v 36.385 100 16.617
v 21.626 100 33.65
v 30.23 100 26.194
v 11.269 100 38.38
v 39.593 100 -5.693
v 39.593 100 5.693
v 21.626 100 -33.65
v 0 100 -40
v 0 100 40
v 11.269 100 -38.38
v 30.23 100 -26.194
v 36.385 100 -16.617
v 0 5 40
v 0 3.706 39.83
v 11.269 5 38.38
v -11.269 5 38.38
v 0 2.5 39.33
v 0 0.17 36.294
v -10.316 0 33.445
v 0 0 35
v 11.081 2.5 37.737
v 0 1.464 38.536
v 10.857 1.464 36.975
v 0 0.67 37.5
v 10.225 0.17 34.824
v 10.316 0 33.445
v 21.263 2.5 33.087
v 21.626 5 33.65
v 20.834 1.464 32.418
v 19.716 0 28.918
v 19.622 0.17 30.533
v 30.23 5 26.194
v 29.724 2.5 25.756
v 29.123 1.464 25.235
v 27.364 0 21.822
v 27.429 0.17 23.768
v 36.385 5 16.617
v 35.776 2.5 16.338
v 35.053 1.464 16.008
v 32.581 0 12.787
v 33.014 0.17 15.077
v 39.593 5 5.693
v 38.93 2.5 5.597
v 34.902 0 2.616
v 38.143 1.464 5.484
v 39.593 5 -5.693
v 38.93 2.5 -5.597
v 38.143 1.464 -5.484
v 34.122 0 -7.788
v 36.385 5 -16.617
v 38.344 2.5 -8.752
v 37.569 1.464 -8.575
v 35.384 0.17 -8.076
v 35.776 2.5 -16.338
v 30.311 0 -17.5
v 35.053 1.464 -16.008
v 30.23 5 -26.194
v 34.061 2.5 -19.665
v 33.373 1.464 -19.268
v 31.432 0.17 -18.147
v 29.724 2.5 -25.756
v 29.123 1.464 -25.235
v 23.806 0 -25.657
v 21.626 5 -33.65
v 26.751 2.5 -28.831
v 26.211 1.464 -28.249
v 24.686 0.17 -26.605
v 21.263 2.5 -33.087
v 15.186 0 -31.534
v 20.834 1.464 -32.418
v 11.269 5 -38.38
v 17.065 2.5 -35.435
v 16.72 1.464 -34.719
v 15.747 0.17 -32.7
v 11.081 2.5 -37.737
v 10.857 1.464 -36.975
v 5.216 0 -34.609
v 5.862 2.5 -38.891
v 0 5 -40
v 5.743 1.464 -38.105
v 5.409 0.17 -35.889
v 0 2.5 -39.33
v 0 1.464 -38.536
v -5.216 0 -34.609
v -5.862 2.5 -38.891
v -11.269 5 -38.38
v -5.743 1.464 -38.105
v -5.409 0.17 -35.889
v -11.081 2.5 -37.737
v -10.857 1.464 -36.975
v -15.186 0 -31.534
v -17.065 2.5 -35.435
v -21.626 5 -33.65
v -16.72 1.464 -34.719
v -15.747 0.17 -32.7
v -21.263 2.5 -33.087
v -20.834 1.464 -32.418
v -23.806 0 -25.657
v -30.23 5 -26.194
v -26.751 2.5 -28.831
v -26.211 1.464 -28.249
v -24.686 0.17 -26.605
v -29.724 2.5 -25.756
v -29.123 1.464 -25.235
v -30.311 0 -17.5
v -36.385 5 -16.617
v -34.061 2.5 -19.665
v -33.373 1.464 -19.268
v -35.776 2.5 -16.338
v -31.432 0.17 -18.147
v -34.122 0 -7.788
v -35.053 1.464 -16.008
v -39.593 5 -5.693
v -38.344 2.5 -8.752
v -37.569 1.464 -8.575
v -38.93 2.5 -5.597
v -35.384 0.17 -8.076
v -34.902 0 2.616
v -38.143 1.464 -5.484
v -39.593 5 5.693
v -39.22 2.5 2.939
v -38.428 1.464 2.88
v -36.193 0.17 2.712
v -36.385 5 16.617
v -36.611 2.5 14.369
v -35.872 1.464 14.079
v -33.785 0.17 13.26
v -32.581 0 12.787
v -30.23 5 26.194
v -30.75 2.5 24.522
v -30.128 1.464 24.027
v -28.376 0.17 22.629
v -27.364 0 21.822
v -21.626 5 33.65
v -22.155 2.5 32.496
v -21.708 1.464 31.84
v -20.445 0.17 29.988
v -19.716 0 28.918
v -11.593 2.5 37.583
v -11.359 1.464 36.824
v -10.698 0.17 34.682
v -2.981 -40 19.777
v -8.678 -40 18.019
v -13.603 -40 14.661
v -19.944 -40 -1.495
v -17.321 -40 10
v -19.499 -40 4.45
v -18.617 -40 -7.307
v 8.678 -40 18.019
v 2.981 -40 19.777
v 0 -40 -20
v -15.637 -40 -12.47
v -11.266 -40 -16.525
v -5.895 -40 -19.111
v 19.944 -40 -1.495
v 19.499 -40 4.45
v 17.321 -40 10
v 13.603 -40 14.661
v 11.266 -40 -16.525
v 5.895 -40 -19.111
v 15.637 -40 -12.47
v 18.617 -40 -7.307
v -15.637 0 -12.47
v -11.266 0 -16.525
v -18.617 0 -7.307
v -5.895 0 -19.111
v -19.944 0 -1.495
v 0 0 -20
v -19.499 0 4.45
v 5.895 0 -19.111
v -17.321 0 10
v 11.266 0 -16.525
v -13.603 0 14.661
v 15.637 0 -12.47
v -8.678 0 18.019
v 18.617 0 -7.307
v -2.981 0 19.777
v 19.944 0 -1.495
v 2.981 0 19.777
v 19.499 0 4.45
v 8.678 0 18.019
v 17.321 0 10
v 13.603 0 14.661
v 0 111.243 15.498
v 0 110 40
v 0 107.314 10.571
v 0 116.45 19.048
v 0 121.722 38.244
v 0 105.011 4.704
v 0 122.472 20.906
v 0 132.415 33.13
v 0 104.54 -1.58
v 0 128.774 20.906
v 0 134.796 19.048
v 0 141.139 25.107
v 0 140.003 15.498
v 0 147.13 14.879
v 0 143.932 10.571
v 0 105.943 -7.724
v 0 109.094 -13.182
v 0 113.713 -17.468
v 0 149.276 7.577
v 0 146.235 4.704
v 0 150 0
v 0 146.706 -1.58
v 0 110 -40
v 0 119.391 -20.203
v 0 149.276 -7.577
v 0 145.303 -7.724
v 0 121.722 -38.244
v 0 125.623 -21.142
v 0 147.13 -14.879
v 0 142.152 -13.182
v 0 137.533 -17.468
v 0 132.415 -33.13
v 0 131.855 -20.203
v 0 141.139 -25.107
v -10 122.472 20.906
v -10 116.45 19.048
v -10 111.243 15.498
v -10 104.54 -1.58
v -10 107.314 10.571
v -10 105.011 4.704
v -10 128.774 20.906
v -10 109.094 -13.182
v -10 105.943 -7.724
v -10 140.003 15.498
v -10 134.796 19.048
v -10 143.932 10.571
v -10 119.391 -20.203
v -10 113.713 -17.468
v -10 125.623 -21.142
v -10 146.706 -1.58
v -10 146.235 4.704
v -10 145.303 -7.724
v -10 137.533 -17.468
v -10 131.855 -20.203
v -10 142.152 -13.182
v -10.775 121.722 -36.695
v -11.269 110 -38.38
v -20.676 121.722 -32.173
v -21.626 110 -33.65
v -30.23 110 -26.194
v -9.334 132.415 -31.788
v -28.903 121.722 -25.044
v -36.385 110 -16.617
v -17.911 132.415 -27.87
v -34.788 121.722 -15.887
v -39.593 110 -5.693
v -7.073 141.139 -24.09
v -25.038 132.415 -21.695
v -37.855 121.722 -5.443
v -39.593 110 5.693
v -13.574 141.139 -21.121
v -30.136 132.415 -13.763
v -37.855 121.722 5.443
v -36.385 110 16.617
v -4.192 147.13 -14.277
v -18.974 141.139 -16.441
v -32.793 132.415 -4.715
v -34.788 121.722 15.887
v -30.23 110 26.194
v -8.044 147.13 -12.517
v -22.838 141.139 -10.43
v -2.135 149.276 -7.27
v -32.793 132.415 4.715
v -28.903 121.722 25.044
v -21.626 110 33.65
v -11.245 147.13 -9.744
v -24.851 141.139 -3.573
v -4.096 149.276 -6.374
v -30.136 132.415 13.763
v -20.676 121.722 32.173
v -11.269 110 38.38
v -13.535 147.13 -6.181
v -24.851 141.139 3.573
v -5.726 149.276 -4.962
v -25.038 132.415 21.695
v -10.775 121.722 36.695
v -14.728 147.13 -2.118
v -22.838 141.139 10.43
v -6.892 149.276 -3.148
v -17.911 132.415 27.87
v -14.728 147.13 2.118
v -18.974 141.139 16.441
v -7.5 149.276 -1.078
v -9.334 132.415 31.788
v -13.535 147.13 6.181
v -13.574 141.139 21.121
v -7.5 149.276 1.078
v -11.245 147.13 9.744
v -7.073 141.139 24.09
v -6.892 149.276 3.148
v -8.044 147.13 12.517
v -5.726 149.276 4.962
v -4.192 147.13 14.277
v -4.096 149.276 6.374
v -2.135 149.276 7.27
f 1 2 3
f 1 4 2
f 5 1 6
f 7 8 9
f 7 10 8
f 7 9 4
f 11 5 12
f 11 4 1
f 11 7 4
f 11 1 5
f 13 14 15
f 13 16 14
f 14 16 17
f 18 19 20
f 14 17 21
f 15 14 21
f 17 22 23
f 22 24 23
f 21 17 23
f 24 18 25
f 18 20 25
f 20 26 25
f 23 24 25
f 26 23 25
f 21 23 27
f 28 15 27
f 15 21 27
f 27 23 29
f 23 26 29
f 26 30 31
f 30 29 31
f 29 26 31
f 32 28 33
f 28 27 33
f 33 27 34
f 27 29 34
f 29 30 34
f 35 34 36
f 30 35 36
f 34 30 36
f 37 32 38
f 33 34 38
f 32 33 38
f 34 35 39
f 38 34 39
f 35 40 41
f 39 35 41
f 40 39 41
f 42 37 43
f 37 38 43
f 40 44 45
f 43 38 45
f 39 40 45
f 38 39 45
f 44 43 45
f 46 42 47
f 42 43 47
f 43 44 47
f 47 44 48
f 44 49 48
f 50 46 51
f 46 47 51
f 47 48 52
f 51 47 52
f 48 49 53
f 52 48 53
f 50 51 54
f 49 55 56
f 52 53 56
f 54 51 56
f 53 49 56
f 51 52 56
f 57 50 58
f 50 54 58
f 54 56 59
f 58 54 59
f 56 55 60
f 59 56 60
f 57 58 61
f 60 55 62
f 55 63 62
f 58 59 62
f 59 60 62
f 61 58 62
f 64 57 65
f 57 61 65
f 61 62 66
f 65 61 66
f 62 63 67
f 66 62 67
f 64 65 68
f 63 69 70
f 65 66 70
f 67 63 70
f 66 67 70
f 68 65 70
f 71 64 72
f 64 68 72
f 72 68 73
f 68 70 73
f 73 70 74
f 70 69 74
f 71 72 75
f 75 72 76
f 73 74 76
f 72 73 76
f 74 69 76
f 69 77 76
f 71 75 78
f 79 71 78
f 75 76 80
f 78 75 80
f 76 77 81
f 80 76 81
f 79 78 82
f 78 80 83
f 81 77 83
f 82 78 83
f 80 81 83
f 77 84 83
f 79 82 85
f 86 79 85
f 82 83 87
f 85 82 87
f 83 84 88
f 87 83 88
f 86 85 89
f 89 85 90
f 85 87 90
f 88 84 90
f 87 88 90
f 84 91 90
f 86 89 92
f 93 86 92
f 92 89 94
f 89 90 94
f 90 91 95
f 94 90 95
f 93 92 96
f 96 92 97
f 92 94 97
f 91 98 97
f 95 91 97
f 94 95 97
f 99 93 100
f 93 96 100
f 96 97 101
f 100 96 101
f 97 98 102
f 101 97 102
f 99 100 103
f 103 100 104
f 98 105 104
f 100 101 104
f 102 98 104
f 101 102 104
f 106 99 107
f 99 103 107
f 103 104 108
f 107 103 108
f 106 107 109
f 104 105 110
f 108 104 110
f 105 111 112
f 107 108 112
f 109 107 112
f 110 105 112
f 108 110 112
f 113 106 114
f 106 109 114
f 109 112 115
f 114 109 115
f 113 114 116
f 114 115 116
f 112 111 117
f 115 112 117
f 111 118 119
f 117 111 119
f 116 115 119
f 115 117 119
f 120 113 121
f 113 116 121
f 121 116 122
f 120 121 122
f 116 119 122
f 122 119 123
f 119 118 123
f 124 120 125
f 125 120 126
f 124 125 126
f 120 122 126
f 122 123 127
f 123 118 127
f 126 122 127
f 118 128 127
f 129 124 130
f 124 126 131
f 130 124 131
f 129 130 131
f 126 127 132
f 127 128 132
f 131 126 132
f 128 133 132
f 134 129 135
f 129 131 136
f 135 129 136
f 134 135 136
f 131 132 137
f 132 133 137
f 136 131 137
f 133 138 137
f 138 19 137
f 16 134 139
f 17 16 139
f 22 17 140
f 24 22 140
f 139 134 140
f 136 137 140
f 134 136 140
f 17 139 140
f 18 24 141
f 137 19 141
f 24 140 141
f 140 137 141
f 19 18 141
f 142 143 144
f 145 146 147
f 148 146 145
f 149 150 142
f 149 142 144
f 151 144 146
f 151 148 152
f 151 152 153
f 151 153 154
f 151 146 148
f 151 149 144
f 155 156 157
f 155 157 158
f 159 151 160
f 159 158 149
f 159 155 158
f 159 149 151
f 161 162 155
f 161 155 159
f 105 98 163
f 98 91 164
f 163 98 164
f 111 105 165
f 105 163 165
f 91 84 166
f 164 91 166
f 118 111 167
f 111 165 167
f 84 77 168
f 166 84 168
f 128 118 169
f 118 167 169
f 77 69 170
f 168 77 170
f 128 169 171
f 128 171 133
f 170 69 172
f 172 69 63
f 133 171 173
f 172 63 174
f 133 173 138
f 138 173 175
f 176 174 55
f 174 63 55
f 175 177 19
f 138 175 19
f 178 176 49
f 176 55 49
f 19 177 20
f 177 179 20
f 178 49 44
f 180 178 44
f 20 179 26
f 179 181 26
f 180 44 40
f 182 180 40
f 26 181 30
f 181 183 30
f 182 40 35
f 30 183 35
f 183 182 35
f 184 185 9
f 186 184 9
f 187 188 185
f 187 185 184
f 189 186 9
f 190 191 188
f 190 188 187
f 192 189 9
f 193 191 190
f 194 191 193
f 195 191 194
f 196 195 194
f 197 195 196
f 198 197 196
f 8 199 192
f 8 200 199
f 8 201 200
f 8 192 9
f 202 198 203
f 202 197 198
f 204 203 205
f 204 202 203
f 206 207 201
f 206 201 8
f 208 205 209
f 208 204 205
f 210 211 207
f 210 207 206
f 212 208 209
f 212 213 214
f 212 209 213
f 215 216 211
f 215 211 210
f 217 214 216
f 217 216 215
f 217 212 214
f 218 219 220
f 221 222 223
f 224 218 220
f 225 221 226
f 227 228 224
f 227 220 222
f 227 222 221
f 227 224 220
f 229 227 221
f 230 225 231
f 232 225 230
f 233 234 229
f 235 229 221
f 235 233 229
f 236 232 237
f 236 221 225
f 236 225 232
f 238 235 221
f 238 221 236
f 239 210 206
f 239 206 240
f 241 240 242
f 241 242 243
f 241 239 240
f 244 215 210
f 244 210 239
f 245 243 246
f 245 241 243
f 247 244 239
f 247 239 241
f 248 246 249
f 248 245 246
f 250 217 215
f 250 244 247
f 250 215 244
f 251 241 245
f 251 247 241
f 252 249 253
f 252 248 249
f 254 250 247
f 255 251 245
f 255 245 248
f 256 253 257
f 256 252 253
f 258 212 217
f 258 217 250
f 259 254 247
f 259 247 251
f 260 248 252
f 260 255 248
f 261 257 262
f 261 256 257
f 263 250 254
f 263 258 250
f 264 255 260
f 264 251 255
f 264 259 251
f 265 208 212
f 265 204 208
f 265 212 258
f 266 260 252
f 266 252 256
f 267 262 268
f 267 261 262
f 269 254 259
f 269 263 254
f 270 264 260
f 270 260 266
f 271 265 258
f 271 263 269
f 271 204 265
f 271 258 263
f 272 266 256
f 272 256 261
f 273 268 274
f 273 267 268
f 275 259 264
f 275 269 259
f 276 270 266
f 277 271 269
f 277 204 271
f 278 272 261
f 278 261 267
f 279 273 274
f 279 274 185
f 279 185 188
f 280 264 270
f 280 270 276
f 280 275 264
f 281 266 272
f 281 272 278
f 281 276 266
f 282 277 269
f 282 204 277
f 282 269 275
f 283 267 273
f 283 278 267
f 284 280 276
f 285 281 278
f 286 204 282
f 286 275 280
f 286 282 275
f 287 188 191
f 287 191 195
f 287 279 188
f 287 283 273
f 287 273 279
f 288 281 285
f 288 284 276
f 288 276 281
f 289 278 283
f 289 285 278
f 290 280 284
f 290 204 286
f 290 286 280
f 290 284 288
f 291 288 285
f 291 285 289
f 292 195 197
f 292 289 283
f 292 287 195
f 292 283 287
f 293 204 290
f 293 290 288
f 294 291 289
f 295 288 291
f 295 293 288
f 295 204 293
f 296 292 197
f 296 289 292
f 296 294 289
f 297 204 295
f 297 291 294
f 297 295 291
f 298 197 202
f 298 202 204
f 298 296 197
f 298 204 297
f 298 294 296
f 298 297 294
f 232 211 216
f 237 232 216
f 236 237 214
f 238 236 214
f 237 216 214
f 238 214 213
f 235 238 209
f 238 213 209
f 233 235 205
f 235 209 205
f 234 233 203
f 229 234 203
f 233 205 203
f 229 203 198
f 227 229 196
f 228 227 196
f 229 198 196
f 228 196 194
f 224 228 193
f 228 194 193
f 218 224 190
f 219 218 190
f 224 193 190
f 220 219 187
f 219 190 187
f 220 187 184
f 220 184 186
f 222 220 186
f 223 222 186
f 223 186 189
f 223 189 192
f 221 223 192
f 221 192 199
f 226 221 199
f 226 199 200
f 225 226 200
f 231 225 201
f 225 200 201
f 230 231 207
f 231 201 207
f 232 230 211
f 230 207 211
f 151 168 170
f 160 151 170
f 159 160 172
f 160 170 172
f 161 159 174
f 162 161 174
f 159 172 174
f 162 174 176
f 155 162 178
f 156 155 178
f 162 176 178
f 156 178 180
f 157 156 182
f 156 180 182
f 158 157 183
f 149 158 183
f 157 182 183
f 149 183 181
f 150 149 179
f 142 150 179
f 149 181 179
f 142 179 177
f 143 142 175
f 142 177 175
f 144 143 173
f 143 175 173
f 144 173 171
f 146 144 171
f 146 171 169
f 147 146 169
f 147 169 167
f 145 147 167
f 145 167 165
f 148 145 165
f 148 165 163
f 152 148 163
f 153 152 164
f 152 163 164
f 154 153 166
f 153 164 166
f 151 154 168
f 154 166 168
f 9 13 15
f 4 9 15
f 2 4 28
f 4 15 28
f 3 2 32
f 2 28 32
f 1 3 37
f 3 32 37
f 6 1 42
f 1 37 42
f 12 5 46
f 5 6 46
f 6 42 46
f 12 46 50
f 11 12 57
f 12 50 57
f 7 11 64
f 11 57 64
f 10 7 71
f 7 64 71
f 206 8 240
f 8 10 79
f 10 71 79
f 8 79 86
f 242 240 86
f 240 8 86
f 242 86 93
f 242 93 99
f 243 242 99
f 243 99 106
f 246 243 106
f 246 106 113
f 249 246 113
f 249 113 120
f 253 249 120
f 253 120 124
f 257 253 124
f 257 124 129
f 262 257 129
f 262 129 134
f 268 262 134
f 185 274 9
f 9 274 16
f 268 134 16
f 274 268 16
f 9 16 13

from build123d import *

# Parameters (mm, degrees)
SKETCH1_R           = 40
BOSS_EXTRUDE1_DEPTH = 150
SKETCH2_R           = 20
BOSS_EXTRUDE2_DEPTH = 40
SKETCH3_W           = 40.516071082
SKETCH3_H           = 80
CUT_EXTRUDE1_DEPTH  = 50
SKETCH4_R           = 21.141799796
CUT_EXTRUDE2_DEPTH  = 10
FILLET1_R           = 40
FILLET2_R           = 5


with BuildPart() as part:
    # Sketch1 → Boss-Extrude1 (new body)
    with BuildSketch(Plane(origin=(0, 0, 0), x_dir=(1, 0, 0), z_dir=(0, 1, 0))):
        with Locations(Location((0, 0, 0), (0, 0, 270))):
            Circle(SKETCH1_R)
    extrude(amount=BOSS_EXTRUDE1_DEPTH)

    # Sketch2 → Boss-Extrude2 (add)
    with BuildSketch(Plane.XZ):
        with Locations(Location((0, 0, 0), (0, 0, 270))):
            Circle(SKETCH2_R)
    extrude(amount=BOSS_EXTRUDE2_DEPTH)

    # Sketch3 → Cut-Extrude1 (cut)
    with BuildSketch(Plane(origin=(0, 150, 0), x_dir=(1, 0, 0), z_dir=(0, 1, 0))):
        with Locations((20.258035541, 0)):
            Rectangle(SKETCH3_W, SKETCH3_H)
    extrude(amount=-CUT_EXTRUDE1_DEPTH, mode=Mode.SUBTRACT)

    # Sketch4 → Cut-Extrude2 (cut)
    with BuildSketch(Plane(origin=(0, 0, 0), x_dir=(0, 0, -1), z_dir=(1, 0, 0))):
        with Locations((0, 125.6230245)):
            Circle(SKETCH4_R)
    extrude(amount=-CUT_EXTRUDE2_DEPTH, mode=Mode.SUBTRACT)

    # Fillet1
    fillet1_edges = [part.edges().sort_by_distance(p)[0] for p in [
        (-40, 150, 0),
    ]]
    fillet(fillet1_edges, radius=FILLET1_R - 0.0001)  # a hair under: the kernel refuses the full size

    # Fillet2
    fillet2_edges = [part.edges().sort_by_distance(p)[0] for p in [
        (0, 0, -40),
    ]]
    fillet(fillet2_edges, radius=FILLET2_R)


solid = part.part
